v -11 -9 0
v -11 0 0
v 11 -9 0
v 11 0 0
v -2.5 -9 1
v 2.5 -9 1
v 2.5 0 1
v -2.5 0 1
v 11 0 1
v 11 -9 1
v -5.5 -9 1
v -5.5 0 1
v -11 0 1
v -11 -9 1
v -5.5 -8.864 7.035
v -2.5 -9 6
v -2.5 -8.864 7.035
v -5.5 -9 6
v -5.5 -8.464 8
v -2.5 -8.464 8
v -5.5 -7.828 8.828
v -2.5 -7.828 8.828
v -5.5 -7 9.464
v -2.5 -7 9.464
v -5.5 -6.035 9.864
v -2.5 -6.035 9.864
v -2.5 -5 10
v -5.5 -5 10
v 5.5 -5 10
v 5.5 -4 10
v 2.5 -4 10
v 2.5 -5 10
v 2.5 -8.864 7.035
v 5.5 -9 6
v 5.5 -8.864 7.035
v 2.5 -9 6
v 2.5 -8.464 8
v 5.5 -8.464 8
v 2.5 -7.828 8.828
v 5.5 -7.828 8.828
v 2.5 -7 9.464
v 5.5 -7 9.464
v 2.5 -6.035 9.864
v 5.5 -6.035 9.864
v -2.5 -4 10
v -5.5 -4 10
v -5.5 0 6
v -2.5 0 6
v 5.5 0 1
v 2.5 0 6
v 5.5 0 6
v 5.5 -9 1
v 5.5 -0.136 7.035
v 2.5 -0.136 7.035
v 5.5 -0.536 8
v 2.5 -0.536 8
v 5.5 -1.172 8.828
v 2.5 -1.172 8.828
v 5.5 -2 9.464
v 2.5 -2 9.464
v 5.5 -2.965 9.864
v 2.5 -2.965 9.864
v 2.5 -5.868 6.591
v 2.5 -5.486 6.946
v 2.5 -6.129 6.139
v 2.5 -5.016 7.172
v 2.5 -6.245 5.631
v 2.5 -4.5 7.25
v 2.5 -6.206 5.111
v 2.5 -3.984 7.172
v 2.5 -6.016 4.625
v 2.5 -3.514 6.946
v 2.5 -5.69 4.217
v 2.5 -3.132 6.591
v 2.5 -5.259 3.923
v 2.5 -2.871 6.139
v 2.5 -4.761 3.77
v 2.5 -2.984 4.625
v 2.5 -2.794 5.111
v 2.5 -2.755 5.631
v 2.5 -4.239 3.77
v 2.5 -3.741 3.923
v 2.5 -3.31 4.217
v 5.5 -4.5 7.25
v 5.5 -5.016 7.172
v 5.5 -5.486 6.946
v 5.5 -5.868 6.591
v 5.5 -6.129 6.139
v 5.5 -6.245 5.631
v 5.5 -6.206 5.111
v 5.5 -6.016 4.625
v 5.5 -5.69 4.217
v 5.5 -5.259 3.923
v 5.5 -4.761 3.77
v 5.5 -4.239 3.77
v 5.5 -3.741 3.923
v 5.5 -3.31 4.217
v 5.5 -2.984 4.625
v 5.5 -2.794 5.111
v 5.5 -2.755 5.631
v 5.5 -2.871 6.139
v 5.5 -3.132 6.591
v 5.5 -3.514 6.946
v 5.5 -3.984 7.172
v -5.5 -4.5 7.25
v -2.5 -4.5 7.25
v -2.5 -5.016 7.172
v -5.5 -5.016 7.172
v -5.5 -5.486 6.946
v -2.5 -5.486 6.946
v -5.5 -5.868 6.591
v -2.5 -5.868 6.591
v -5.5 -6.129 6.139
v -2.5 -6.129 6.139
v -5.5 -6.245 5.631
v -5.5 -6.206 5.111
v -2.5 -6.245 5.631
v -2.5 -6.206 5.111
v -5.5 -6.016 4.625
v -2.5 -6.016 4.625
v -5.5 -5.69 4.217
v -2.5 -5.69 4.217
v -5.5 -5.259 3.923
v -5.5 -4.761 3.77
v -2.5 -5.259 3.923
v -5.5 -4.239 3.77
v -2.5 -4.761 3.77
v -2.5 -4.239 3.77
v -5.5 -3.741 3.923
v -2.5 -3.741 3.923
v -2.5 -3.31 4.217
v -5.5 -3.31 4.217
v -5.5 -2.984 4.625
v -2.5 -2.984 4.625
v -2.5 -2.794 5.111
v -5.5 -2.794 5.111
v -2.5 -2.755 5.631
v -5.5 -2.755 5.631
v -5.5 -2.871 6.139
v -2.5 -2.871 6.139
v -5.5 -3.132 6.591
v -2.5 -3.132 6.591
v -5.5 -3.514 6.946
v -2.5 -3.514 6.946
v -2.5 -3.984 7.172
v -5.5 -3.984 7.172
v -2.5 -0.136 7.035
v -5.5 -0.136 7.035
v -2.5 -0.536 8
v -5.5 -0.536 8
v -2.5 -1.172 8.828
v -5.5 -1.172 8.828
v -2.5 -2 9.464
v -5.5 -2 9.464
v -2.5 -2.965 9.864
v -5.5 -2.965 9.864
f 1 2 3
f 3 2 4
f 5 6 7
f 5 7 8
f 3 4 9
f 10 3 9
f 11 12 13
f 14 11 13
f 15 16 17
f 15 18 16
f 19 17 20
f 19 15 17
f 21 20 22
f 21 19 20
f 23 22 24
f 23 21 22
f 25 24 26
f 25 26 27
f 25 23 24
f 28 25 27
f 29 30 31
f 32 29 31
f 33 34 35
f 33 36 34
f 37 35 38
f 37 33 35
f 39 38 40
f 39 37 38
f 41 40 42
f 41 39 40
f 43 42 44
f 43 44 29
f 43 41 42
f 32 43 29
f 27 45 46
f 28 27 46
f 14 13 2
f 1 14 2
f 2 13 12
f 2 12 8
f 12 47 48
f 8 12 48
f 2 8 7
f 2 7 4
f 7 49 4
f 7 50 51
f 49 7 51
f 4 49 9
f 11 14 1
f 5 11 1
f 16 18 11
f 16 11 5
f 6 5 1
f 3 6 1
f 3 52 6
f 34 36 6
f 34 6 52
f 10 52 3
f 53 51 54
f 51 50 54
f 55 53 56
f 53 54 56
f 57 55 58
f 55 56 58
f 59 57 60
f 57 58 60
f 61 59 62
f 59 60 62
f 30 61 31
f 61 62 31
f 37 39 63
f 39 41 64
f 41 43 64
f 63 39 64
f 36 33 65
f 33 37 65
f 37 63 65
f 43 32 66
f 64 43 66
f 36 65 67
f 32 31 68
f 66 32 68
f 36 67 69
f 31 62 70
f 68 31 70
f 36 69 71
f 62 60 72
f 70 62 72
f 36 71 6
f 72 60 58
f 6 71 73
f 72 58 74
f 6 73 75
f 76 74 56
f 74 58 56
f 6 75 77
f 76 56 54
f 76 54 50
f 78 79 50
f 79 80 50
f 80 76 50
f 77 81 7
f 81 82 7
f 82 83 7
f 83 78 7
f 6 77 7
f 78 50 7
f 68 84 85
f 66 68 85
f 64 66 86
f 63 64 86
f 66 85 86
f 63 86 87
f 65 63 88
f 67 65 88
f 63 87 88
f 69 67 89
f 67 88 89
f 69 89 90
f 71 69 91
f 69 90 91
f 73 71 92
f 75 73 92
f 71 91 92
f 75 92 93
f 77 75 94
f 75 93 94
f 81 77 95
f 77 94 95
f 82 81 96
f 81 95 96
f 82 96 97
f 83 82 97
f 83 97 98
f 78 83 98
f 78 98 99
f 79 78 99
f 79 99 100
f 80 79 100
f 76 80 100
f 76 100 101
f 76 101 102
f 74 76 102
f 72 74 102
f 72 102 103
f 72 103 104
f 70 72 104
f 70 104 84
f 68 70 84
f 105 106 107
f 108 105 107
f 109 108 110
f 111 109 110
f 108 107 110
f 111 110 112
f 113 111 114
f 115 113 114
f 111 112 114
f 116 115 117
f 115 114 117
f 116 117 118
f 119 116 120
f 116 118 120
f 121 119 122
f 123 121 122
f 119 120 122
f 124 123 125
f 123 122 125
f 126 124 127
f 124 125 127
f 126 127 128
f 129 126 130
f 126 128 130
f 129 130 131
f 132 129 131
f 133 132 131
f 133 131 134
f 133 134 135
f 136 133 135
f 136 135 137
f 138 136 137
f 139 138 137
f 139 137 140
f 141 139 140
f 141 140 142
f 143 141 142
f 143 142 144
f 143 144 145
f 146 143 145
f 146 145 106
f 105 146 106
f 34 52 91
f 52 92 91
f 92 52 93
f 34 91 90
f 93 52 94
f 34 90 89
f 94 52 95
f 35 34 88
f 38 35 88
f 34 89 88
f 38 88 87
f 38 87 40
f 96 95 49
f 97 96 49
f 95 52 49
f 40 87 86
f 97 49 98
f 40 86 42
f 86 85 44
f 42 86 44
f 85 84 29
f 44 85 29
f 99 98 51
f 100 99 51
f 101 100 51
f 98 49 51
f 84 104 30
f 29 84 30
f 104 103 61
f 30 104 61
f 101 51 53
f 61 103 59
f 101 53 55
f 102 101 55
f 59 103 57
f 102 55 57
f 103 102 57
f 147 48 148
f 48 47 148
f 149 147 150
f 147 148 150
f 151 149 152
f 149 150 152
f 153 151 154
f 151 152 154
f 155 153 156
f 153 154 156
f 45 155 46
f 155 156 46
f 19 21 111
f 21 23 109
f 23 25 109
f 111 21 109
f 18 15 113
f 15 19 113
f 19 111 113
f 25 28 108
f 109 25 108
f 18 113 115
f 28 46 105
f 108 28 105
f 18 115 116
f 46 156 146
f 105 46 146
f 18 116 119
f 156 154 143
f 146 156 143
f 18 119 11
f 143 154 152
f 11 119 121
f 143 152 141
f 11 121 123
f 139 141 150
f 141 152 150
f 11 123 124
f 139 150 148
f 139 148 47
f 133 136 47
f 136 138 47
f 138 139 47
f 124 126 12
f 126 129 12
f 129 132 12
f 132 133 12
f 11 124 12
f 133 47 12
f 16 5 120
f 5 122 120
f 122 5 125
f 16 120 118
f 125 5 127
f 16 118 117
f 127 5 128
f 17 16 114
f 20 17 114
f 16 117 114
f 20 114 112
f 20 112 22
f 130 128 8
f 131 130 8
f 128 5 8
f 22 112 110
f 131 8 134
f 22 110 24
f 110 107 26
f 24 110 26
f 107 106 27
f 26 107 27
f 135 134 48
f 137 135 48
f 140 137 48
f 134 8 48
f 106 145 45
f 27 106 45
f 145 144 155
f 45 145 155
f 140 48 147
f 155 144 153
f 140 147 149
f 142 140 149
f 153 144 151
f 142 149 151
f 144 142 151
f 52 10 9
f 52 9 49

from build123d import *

# Parameters (mm, degrees)
F1_DEPTH = 9
F2_R     = 1.75
F3_DEPTH = 25
F4_R     = 4
F5_ANGLE = 90


with BuildPart() as f1:
    # F0 (on Top) → F1 (new body)
    with BuildSketch(Plane.XY):
        Polygon((-11, 1), (-11, 0), (11, 0), (11, 1), (5.5, 1), (5.5, 10), (2.5, 10), (2.5, 1), (-2.5, 1), (-2.5, 10), (-5.5, 10), (-5.5, 1), align=None)
    extrude(amount=F1_DEPTH)

    # F2 (on face) → F3 (cut)
    with BuildSketch(Plane.YZ.offset(5.5)):
        with Locations((5.5, 4.5)):
            Circle(F2_R)
    extrude(amount=-F3_DEPTH, mode=Mode.SUBTRACT)

    # F4
    f4_edges = [f1.edges().sort_by_distance(p)[0] for p in [
        (-4, 10, 9),
        (4, 10, 9),
        (4, 10, 0),
        (-4, 10, 0),
    ]]
    fillet(f4_edges, radius=F4_R)


with BuildPart() as f1_1:
    # F5: moved
    add(f1.part.rotate(Axis((0, 0, 0), (1, 0, 0)), F5_ANGLE))


solid = f1_1.part
